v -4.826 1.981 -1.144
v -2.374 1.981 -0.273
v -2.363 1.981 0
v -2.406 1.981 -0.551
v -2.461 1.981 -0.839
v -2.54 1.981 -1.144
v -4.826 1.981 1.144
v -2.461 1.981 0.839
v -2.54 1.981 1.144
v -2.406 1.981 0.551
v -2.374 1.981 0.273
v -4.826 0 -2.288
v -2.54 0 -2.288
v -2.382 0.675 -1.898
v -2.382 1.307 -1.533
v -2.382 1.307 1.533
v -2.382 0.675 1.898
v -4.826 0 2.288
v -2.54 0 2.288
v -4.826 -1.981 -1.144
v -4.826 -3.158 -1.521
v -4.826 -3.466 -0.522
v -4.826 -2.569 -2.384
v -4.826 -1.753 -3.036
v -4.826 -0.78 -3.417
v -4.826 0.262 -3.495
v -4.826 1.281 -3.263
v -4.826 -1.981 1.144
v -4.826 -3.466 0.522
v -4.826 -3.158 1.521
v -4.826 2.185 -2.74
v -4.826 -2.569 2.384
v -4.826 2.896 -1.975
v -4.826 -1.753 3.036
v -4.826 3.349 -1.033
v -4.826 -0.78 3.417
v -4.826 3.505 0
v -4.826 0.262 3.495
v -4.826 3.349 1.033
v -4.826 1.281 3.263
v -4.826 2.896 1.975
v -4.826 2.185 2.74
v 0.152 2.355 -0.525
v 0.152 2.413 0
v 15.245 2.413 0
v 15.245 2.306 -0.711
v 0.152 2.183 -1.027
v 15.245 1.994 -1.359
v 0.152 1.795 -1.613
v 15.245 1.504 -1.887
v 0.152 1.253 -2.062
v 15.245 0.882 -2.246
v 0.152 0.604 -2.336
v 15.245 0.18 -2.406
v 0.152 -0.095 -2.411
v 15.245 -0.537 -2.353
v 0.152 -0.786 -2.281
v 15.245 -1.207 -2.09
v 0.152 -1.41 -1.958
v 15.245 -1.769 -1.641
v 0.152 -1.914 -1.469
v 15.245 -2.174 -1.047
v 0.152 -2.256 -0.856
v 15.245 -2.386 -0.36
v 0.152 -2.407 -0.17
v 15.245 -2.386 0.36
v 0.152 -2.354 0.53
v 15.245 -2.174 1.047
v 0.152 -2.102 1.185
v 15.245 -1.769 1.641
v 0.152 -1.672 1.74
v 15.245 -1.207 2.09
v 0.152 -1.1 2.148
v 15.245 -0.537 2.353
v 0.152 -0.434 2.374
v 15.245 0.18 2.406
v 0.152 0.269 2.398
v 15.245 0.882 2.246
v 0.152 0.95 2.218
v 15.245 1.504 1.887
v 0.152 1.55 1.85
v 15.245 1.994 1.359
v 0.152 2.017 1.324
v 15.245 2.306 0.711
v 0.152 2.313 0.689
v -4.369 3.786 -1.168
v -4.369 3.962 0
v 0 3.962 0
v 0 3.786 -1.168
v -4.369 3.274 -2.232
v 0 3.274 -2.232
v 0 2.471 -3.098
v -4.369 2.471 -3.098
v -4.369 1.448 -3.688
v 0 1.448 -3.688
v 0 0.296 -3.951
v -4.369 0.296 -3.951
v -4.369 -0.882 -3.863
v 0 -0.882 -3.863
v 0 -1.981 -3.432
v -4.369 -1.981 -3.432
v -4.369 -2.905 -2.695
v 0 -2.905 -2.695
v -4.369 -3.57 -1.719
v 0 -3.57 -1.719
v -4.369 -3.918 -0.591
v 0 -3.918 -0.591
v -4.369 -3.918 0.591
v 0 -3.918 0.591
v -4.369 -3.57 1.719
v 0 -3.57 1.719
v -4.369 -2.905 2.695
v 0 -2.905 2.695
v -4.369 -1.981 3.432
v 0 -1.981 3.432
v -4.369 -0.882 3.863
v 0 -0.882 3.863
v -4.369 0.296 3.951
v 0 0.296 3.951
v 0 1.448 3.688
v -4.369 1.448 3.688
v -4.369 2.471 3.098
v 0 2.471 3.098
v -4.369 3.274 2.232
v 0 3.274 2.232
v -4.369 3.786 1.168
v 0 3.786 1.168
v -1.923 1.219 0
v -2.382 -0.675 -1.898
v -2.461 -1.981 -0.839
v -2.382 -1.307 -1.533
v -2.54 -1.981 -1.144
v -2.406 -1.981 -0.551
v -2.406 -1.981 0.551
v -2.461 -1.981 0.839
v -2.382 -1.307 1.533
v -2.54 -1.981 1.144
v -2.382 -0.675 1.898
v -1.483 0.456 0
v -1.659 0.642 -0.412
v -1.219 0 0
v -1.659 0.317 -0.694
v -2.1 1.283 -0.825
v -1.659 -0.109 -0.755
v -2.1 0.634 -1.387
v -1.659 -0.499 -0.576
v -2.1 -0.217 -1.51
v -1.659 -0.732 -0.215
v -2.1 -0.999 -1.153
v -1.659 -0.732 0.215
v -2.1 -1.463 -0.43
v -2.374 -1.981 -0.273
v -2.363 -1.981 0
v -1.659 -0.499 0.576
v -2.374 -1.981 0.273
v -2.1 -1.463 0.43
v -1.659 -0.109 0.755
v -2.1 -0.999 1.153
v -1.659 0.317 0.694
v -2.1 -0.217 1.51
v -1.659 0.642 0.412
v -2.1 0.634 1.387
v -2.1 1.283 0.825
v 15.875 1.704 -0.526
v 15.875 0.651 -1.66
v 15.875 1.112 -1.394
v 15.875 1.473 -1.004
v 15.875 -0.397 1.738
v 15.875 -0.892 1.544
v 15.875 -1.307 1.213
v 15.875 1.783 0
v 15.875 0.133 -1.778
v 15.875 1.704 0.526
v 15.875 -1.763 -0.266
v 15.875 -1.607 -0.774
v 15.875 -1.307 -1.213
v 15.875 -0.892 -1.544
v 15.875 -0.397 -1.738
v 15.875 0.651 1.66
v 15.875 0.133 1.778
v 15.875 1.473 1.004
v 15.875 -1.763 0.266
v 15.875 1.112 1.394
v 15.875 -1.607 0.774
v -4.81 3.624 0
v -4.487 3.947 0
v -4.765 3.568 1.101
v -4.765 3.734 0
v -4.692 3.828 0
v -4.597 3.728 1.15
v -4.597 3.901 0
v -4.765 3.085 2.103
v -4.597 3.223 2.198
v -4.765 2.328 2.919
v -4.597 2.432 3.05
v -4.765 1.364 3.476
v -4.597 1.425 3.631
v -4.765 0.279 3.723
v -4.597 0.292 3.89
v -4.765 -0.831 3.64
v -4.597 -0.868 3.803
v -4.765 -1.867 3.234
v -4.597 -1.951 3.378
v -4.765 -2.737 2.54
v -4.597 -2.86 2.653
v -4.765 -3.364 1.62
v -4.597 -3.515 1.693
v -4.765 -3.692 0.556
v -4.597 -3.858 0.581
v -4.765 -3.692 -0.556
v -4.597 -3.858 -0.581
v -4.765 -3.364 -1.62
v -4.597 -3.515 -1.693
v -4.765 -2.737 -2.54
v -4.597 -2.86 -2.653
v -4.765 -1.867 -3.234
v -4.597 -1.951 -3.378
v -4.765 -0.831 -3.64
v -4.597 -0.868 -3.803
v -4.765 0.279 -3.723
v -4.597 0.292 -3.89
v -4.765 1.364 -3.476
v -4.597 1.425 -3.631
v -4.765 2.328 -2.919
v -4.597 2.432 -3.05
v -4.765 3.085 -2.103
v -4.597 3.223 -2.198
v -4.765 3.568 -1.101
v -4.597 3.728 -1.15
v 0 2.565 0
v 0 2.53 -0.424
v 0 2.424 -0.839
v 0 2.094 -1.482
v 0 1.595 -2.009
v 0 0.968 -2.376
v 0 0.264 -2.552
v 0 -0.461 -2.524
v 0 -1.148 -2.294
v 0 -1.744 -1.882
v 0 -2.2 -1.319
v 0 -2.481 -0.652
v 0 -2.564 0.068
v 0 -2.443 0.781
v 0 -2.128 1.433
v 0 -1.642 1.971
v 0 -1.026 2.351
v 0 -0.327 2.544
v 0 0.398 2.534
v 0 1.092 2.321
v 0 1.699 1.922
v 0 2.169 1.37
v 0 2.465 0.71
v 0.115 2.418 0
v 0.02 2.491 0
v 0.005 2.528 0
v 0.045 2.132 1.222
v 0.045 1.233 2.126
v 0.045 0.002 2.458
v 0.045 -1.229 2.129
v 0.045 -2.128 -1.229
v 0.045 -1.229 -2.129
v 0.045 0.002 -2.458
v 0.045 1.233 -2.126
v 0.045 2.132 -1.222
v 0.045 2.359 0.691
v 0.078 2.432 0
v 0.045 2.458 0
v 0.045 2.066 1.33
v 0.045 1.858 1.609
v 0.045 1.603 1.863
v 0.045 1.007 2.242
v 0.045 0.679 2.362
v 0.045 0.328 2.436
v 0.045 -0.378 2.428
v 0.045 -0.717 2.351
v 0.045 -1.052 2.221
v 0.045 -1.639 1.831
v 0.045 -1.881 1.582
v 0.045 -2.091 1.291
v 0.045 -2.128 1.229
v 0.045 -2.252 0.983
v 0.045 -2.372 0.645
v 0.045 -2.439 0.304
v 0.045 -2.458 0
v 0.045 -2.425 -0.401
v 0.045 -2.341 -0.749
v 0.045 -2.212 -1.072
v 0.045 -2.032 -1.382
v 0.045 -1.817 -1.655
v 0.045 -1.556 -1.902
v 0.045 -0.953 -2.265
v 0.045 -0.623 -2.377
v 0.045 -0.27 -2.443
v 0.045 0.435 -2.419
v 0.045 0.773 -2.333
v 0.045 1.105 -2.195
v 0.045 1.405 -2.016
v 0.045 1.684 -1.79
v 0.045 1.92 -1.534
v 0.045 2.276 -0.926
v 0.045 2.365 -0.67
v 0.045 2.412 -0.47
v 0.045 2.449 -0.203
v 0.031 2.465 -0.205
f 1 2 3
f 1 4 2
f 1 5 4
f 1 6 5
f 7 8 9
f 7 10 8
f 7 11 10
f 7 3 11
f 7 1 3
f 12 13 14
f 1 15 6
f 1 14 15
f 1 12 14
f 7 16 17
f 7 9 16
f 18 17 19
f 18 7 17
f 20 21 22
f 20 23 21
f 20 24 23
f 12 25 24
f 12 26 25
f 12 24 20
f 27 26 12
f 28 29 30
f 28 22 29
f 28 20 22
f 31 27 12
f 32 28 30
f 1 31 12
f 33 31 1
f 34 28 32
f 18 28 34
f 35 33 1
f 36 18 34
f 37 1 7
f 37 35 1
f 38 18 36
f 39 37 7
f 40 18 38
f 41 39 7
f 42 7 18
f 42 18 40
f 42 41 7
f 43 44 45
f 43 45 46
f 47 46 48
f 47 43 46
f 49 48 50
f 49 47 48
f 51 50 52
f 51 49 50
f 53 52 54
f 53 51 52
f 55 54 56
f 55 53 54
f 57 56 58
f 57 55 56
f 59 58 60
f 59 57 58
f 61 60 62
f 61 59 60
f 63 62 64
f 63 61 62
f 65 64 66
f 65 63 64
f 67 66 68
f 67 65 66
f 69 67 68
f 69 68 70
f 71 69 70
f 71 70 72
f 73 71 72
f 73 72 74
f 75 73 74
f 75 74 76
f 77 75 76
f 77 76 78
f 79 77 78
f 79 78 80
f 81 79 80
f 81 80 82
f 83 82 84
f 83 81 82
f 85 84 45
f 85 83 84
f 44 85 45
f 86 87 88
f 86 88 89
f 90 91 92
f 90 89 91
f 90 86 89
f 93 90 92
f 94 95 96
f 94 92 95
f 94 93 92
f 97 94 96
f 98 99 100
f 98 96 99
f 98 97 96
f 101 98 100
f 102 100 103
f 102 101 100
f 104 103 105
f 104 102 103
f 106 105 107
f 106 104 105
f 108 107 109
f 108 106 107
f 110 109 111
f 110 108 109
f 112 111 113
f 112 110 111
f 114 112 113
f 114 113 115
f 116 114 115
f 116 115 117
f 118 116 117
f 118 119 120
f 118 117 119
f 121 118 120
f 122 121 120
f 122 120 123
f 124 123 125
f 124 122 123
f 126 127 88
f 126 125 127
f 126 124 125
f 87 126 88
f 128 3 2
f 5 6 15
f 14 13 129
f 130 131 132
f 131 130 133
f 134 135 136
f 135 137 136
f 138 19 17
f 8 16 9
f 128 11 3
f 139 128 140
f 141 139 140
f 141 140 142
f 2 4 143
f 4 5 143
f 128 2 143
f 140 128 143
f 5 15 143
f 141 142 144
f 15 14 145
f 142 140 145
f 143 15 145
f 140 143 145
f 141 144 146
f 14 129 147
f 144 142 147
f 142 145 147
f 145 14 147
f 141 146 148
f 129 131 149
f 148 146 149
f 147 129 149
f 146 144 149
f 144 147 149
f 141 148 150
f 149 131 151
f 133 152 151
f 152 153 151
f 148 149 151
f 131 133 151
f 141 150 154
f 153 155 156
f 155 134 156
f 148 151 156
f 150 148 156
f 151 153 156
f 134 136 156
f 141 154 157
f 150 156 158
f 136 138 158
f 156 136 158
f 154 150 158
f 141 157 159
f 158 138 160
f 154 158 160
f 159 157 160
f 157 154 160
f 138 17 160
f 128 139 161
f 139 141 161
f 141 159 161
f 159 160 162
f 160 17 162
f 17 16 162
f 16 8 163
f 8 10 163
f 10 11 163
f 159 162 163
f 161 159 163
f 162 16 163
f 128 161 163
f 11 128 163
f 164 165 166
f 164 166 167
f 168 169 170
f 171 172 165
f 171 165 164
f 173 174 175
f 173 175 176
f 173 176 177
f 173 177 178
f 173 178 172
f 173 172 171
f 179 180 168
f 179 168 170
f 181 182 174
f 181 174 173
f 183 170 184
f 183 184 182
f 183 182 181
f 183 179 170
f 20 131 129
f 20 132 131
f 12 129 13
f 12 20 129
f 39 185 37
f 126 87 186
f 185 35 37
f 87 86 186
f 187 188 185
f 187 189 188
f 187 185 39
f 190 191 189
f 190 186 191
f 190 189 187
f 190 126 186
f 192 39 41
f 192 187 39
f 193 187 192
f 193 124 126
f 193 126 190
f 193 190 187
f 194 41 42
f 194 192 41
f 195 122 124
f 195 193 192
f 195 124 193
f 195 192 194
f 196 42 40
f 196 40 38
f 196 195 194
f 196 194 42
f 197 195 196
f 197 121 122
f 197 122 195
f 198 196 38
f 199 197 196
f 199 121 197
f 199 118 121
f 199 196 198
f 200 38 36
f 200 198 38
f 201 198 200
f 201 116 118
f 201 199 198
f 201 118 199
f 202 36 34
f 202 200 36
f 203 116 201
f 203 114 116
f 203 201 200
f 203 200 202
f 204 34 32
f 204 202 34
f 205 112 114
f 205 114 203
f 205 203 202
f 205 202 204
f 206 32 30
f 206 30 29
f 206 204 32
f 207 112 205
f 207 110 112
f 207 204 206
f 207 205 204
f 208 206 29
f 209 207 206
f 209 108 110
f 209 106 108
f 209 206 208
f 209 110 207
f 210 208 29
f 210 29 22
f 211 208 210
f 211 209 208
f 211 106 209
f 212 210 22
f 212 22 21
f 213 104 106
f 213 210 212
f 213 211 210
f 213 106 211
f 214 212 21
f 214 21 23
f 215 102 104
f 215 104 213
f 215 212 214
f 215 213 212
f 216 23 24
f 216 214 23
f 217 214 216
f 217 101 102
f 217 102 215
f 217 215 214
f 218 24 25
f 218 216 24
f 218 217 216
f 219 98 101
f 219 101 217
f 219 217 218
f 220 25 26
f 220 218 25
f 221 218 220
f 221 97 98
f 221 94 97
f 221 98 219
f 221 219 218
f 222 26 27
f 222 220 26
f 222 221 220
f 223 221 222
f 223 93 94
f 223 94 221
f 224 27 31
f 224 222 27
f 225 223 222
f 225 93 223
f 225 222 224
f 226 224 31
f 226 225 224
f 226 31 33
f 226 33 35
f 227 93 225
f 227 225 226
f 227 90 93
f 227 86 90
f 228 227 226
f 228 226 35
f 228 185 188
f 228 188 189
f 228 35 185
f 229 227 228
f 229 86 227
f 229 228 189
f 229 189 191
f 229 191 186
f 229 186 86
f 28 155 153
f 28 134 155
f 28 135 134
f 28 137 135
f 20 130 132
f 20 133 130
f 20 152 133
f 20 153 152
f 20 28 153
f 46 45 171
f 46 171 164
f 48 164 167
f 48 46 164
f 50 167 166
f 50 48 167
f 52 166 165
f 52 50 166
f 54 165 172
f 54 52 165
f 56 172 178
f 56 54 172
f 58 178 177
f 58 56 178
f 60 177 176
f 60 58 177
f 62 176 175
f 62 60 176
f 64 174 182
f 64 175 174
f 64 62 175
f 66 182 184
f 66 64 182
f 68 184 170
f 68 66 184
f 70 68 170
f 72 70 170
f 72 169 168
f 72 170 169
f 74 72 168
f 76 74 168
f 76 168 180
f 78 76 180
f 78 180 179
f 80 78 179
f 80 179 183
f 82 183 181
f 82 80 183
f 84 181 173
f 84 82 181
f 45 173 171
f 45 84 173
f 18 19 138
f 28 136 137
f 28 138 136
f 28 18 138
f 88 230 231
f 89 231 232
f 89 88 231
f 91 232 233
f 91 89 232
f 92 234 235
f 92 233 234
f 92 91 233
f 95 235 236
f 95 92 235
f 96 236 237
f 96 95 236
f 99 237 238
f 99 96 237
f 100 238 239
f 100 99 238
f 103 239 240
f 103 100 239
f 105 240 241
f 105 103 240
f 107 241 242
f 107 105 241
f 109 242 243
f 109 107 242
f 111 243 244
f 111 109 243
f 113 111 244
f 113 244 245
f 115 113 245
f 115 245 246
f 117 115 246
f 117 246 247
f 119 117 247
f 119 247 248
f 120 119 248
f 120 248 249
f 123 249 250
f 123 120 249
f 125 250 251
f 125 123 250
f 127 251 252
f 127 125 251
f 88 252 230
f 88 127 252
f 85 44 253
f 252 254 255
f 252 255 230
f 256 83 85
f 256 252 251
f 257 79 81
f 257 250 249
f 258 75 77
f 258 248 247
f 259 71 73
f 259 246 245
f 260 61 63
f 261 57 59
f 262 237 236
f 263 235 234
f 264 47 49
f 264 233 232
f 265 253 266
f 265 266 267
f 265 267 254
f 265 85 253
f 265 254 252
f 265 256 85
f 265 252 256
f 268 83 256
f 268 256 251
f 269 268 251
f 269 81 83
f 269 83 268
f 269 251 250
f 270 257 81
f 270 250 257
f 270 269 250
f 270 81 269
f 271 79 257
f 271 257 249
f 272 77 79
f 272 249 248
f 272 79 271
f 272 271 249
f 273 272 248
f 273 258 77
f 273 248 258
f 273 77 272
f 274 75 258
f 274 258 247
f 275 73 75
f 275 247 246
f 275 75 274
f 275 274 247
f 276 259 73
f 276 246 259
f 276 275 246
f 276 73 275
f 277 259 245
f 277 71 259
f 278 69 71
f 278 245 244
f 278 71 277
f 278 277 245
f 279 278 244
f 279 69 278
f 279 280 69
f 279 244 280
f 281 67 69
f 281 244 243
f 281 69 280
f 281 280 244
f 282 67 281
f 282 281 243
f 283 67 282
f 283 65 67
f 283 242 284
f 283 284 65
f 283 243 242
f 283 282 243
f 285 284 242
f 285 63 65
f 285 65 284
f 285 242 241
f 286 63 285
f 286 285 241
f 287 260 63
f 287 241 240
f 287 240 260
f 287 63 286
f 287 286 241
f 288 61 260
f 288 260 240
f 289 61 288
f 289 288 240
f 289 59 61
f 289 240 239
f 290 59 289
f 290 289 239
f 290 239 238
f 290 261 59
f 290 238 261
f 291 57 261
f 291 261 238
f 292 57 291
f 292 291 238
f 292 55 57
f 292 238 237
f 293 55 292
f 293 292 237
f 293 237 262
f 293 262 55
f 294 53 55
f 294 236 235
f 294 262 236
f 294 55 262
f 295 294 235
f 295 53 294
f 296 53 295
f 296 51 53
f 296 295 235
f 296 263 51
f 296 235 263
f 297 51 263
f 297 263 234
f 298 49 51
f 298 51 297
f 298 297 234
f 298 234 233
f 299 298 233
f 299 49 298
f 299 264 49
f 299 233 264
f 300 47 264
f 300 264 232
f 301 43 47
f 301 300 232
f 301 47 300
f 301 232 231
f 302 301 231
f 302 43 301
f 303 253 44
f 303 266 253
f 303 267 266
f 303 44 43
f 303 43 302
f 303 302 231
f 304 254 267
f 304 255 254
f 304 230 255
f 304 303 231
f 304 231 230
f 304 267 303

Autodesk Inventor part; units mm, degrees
ref_plane "YZ Plane" through (0, 0, 0) normal (1, 0, 0) x (0, 1, 0)
ref_plane "XZ Plane" through (0, 0, 0) normal (0, 1, 0) x (-1, 0, 0)
sketch "Sketch1" plane through (0, 0, 0) normal (0, 0, 1) x (1, 0, 0)
  line L0 (-1.2192, 0) -> (15.875, 0)
  line L1 (15.875, 0) -> (15.875, 2.413)
  line L2 (15.875, 2.413) -> (2.6461, 2.413)
  line L3 (2.6461, 2.413) -> (0.0001, 2.413)
  line L4 (0.0001, 2.413) -> (0, 2.413)
  line L5 (0, 2.413) -> (0, 3.9624)
  line L6 (0, 3.9624) -> (-4.826, 3.9624)
  line L7 (-4.826, 3.9624) -> (-4.826, 2.2877)
  line L8 (-4.826, 2.2877) -> (-2.54, 2.2877)
  line L9 (-2.54, 2.2877) -> (-1.2192, 0)
  line L10 (-8.9662, 0) -> (20.0152, 0) projected
  line L11 (0, -0.7925) -> (0, 4.7549) projected
  line L12 (2.6461, 2.413) -> (0, 2.413) construction
  dimension "d1" = 13.2289
  dimension "d2" = 2.646
  dimension "d3" = 4.826
  dimension "d4" = 2.286
  dimension "d5" = 60
  dimension "d6" = 4.826
  dimension "d7" = 4.826
  dimension "d8" = 4.5754
  dimension "d9" = 7.9248
  dimension "d26" = 15.875
revolve "Body" add sketch "Sketch1" angle 360 about axis through (-1.2192, 0, 0) along (1, 0, 0)
sketch "Sketch2" plane through (-4.826, 0, 0) normal (-1, 0, 0) x (0, 0, 1)
  circle A0 centre (0, 0) radius 2.2877 projected
  line L0 (0, -5.5474) -> (0, 5.5474) projected
  line L1 (-5.5474, 0) -> (5.5474, 0) projected
  line L2 (2.2877, 0) -> (1.1438, -1.9812)
  line L3 (1.1438, -1.9812) -> (-1.1438, -1.9812)
  line L4 (-1.1438, -1.9812) -> (-2.2877, 0)
  line L5 (-2.2877, 0) -> (-1.1438, 1.9812)
  line L6 (-1.1438, 1.9812) -> (1.1438, 1.9812)
  line L7 (1.1438, 1.9812) -> (2.2877, 0)
extrude "Slot" add sketch "Sketch2" against normal up to next contours L7 A0 | A0 L2 | L6 L0 A0 | A0 L0 L3 | L0 L6 A0 | A0 L3 L0 | L4 A0 | A0 L5
fillet "Fillet1" radius 0.4572 1 edges at (-4.826, -3.9624, 0)
thread "Thread" size "10-24 UNC" class "2A" standard "ANSI Unified Screw Threads" length 13.2289
chamfer "Chamfer1" distance 0.6299 distance2 0.6299 1 edges at (15.875, -2.413, 0) measured on face at (15.875, -1.2173, -0.6389)
ref_plane "Work Plane1" through (29, 0, 0) normal (0, -1, 0) x (1, 0, 0)
fillet "Fillet2" radius 0.1524 1 edges at (0.0001, -2.413, 0)
equation "\"d30\" = R"
equation "\"d17\" = RR"
equation "\"d13\" = GEL"
equation "\"d15\" = -0.5 * SPD + 0.5 * GD"
equation "\"d16\" = GUL"
equation "\"d1\" = GEL"
equation "\"d3\" = KOH"
equation "\"d4\" = INTI"
equation "\"d6\" = GD"
equation "\"d7\" = BDM"
equation "\"d8\" = 1.1547 * SW"
equation "\"d9\" = KOD"
equation "\"d26\" = NLG"
equation "\"GD\" = 4.826"
equation "\"NLG\" = 15.875"
equation "\"GEL\" = 13.22888"
equation "\"KOD\" = 7.9248"
equation "\"KOH\" = 4.826"
equation "\"INTI\" = 2.286"
equation "\"GAL\" = 2.64592"
equation "\"GUL\" = 0.62992"
equation "\"BDM\" = 4.826"
equation "\"SW\" = 3.9624"
equation "\"RR\" = 0.4572"
equation "\"SPD\" = 3.56616"
equation "\"R\" = 0.1524"
equation "\"PHH\" = 0.127"
equation "\"GD1\" = SPD"
equation "\"THREADDIA\" = 4.826"
equation "\"FAWI\" = 45deg"
equation "\"KOH1\" = 4.3434"
equation "\"NND\" = 4.826"
equation "\"TOA\" = 30deg"
equation "\"E0\" = 1.155 * SW"
properties part number "am-1120" material "Steel, Mild"
